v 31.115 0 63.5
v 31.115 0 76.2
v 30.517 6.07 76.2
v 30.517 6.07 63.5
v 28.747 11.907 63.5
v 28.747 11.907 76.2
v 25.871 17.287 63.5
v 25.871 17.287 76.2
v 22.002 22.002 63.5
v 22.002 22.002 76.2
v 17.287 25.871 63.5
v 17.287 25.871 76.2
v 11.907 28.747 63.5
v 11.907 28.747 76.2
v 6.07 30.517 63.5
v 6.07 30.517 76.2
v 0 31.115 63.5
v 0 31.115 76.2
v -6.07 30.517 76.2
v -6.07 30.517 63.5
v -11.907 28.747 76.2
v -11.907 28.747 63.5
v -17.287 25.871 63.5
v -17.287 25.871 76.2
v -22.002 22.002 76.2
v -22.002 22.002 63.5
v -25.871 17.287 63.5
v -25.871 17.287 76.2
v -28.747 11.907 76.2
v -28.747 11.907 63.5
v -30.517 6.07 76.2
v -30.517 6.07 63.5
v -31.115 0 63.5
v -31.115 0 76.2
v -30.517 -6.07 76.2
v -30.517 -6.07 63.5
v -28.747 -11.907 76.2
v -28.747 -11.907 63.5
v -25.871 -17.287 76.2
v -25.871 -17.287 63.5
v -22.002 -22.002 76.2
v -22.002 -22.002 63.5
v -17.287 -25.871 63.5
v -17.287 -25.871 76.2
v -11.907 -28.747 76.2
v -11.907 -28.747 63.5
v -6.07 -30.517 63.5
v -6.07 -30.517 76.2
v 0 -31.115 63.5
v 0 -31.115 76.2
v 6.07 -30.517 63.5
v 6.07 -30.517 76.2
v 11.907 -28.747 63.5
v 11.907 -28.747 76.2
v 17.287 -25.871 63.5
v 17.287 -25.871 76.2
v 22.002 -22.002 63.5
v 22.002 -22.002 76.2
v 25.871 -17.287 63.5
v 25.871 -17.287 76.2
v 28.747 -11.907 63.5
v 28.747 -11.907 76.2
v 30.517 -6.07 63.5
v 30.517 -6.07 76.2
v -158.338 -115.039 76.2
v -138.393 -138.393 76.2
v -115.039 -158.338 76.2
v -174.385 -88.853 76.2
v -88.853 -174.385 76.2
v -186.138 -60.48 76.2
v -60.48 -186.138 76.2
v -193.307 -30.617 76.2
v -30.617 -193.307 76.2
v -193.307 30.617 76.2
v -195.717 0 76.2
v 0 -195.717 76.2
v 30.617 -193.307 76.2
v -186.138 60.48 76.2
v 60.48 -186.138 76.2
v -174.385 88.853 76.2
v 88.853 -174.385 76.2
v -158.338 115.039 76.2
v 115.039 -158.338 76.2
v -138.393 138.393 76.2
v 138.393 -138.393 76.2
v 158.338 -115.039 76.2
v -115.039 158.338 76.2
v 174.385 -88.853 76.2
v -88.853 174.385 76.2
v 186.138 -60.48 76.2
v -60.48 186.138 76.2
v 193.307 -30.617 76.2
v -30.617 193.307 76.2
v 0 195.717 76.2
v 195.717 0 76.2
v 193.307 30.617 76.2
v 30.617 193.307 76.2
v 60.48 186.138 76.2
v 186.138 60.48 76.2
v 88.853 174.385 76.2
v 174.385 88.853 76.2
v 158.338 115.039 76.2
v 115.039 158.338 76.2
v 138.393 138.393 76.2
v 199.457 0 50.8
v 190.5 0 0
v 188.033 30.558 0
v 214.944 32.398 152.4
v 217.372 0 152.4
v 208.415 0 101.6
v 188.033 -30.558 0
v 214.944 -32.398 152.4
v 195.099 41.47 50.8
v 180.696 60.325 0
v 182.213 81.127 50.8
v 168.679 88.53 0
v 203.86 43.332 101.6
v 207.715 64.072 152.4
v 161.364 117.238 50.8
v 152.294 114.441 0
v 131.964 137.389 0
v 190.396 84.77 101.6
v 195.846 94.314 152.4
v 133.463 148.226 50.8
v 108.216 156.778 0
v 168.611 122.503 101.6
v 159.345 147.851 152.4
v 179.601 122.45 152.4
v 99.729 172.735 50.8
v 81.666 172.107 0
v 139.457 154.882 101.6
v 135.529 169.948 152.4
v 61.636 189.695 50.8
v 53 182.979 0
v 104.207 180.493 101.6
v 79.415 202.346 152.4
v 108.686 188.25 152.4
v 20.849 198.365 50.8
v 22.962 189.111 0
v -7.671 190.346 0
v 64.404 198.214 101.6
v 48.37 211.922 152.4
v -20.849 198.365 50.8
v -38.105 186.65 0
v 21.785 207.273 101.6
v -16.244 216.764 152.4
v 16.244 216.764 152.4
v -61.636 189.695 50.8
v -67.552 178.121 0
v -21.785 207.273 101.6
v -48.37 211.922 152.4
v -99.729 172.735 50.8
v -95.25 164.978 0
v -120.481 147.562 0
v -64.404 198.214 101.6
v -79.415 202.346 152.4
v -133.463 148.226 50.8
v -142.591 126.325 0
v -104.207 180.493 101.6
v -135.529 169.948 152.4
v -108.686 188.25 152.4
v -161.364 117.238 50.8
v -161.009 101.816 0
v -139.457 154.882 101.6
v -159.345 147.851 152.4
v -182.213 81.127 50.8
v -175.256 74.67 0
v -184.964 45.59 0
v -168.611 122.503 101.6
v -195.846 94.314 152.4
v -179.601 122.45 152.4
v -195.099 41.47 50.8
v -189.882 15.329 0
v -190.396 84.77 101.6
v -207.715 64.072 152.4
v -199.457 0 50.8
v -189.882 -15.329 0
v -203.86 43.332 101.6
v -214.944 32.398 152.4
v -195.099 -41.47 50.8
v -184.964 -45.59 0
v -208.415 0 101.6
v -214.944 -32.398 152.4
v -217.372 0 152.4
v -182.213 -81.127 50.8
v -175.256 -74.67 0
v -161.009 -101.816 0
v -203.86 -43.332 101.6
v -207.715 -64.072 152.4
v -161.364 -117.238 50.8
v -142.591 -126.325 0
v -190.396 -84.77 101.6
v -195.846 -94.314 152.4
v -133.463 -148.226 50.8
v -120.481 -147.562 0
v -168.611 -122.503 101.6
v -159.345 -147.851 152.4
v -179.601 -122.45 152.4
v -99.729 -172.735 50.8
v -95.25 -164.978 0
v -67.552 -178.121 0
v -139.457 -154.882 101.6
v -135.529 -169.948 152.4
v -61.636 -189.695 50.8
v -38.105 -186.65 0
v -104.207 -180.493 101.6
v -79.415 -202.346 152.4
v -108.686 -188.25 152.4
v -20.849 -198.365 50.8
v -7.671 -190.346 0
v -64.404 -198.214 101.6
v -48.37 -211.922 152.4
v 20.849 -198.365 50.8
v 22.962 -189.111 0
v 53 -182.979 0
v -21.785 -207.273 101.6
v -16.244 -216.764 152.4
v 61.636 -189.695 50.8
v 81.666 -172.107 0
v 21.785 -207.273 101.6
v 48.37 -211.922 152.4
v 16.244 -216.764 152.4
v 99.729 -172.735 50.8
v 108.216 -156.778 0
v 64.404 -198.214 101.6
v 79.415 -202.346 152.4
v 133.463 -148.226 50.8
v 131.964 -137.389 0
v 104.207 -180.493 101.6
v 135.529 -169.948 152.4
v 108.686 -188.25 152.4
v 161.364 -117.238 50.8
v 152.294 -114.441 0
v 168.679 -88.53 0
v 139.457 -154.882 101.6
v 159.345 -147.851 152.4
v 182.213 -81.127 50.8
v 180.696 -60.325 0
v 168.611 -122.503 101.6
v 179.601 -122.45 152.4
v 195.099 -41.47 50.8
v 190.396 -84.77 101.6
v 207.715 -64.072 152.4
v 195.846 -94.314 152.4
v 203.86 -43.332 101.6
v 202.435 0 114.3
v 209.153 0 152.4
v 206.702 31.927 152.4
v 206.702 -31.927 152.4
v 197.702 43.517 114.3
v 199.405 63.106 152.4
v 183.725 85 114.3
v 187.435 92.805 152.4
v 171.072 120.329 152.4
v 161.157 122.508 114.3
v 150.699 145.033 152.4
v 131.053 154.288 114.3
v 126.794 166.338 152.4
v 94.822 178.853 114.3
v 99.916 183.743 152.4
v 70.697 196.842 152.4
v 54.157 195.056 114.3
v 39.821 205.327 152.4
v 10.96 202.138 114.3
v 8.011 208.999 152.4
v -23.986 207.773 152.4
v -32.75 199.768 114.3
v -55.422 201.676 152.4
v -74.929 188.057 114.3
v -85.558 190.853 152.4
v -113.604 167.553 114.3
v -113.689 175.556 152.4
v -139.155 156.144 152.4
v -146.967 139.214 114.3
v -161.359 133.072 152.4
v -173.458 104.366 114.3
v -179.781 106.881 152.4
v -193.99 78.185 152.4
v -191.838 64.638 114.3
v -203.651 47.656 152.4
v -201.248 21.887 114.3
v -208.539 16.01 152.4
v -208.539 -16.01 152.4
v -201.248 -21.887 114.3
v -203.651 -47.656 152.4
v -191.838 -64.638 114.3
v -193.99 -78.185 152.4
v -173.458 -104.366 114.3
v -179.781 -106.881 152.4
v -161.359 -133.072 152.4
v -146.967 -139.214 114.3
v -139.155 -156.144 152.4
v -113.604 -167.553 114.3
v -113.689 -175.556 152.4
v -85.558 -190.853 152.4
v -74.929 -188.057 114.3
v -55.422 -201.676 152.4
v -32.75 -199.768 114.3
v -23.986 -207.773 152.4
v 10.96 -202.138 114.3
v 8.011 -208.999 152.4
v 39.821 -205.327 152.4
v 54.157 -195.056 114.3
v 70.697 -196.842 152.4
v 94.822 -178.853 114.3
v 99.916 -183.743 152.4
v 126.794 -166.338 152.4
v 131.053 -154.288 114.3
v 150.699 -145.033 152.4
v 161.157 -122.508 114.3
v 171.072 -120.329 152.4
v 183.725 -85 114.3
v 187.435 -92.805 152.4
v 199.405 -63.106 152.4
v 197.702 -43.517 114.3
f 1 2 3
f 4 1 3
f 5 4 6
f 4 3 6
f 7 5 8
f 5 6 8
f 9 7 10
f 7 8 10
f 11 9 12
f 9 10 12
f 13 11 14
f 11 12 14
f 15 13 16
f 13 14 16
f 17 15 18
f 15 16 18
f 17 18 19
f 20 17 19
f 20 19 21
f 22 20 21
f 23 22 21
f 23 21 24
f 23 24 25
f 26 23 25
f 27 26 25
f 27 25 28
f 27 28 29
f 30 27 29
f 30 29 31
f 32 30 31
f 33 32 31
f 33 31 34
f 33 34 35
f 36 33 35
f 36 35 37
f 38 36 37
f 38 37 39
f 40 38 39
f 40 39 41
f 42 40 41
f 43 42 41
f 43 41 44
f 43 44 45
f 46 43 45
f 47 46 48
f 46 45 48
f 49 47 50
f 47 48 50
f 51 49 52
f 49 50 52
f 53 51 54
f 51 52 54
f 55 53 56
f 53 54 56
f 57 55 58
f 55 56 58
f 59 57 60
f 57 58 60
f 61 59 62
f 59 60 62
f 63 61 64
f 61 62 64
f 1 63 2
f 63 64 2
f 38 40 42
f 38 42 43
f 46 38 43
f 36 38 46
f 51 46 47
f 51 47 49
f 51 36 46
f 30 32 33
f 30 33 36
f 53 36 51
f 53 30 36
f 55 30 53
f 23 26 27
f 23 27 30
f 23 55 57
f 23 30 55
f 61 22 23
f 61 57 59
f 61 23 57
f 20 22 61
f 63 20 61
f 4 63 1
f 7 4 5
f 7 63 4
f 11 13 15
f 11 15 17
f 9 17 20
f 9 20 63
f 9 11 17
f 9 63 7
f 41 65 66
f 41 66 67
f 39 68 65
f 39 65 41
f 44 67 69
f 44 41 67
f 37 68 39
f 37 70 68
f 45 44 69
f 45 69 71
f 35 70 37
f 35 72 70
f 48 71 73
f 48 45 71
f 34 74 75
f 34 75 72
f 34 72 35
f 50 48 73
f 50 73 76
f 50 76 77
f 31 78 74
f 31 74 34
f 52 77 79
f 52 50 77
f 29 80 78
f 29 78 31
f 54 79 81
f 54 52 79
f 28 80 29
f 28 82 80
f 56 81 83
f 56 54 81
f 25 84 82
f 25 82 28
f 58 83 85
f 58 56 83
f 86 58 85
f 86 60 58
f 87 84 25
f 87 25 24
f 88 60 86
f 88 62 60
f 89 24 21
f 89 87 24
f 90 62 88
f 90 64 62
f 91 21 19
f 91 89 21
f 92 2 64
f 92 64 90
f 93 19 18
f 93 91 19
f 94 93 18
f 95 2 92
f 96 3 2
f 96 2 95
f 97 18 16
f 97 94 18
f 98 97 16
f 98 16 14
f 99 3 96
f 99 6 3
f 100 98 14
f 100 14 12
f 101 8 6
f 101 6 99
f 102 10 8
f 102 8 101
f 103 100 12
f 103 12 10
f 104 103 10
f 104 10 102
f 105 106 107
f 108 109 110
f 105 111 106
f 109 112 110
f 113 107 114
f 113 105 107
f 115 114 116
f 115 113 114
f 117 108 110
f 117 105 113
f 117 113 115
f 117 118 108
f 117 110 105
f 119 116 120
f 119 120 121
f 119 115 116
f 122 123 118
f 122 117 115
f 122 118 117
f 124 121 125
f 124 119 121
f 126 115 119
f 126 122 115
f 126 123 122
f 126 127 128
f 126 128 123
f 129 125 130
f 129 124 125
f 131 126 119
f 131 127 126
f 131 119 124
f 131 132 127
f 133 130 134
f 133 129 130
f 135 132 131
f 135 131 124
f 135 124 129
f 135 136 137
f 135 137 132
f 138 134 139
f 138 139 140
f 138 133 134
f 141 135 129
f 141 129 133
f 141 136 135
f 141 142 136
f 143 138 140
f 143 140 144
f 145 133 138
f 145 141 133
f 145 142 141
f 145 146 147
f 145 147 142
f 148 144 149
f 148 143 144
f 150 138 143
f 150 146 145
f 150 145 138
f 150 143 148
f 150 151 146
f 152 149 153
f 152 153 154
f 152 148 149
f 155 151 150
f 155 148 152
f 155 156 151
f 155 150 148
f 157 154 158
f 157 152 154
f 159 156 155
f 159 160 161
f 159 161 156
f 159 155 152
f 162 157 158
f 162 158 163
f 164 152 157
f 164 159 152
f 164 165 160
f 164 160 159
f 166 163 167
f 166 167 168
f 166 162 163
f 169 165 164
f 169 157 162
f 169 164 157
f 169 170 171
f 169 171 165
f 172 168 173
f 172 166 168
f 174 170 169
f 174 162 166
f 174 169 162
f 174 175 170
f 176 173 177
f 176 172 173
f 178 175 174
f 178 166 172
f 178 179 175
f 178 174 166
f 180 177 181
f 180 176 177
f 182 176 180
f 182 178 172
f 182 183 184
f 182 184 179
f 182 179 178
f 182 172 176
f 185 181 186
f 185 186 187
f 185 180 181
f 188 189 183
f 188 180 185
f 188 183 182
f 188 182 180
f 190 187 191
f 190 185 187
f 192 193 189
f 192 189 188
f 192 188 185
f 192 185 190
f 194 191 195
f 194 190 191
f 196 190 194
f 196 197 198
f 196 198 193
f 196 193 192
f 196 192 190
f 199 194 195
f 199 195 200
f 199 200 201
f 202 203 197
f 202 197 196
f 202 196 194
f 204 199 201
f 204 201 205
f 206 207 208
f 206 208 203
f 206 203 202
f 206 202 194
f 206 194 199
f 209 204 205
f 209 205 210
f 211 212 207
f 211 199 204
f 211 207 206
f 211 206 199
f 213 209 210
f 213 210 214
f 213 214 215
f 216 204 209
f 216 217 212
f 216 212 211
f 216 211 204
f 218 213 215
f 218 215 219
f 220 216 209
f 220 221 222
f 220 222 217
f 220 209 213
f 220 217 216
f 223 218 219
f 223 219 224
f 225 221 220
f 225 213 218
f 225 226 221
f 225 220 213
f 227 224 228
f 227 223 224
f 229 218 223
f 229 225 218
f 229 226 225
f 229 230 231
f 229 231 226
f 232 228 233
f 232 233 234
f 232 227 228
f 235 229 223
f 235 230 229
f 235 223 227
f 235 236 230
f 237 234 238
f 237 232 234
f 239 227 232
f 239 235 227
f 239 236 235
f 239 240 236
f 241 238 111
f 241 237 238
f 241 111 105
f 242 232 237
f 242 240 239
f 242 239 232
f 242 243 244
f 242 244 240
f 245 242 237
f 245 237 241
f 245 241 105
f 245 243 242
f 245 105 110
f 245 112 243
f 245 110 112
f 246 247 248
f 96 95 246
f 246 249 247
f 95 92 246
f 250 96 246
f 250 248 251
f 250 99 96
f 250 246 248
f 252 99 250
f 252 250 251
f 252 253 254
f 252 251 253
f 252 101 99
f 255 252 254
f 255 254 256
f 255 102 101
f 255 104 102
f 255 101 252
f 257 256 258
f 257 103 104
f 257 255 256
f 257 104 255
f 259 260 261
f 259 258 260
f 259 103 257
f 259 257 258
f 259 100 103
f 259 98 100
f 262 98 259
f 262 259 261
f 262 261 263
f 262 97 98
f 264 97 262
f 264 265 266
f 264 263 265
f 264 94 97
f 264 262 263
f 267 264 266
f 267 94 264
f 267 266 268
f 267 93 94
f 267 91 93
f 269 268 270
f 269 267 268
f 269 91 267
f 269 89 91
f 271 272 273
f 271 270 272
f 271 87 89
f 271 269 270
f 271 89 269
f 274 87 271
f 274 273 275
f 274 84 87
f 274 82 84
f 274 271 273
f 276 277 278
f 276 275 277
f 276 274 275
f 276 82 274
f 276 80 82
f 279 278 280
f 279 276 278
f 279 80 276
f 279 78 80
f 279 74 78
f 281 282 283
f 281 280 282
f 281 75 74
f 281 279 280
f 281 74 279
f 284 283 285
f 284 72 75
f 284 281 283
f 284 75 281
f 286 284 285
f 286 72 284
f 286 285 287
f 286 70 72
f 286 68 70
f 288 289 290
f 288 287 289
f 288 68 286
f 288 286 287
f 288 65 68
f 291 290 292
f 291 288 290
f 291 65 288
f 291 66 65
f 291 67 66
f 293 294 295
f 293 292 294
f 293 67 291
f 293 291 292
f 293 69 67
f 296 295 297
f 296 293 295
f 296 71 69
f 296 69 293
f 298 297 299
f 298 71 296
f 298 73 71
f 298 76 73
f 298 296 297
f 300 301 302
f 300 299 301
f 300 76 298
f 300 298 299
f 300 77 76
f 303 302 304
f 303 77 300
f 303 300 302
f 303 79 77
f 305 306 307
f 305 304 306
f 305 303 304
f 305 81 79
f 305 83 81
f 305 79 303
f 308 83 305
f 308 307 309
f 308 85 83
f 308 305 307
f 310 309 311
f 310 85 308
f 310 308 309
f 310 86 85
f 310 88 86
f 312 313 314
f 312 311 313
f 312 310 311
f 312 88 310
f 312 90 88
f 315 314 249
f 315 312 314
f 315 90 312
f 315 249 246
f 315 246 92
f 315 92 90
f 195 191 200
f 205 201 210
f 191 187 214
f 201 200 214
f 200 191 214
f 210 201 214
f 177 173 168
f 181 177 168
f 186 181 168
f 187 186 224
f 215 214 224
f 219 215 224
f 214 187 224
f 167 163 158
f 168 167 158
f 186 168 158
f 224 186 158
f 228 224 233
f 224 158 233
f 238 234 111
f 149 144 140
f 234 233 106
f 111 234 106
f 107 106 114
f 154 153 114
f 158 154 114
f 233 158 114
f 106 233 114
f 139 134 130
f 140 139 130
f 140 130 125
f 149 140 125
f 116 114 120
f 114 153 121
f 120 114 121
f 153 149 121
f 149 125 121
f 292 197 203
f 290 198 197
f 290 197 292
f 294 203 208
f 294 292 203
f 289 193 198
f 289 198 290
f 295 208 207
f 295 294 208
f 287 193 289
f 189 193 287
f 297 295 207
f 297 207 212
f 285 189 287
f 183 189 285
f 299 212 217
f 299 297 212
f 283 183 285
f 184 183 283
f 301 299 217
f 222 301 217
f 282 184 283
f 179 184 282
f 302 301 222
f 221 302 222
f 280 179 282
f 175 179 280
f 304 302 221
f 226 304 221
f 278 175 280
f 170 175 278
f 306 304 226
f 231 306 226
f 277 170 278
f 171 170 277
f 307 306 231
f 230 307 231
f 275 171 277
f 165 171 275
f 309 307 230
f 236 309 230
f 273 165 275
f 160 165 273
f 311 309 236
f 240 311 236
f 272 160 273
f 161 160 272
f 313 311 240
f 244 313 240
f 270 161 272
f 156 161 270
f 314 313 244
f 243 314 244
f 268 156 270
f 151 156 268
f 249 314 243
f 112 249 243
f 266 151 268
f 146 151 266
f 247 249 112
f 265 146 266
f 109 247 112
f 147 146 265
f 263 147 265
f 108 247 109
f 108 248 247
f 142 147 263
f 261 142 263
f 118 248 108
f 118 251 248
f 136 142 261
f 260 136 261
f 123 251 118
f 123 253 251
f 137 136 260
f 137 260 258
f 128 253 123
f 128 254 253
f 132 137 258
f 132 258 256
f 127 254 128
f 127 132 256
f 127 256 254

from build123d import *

# Parameters (mm, degrees)
F0_R     = 190.5
F1_DEPTH = 152.4
F1_TAPER = -10
F2_R     = 31.115
F3_DEPTH = 88.9
F4_R     = 209.1526888915
F5_DEPTH = 76.2
F5_TAPER = 10


with BuildPart() as f1:
    # F0 (on Top) → F1 (new body)
    with BuildSketch(Plane.XY):
        Circle(F0_R)
    extrude(amount=F1_DEPTH, taper=F1_TAPER)

    # F2 (on face) → F3 (cut)
    with BuildSketch(Plane.XY.offset(152.4)):
        Circle(F2_R)
    extrude(amount=-F3_DEPTH, mode=Mode.SUBTRACT)

    # F4 (on face) → F5 (cut)
    with BuildSketch(Plane.XY.offset(152.4)):
        Circle(F4_R)
    extrude(amount=-F5_DEPTH, taper=F5_TAPER, mode=Mode.SUBTRACT)


solid = f1.part
